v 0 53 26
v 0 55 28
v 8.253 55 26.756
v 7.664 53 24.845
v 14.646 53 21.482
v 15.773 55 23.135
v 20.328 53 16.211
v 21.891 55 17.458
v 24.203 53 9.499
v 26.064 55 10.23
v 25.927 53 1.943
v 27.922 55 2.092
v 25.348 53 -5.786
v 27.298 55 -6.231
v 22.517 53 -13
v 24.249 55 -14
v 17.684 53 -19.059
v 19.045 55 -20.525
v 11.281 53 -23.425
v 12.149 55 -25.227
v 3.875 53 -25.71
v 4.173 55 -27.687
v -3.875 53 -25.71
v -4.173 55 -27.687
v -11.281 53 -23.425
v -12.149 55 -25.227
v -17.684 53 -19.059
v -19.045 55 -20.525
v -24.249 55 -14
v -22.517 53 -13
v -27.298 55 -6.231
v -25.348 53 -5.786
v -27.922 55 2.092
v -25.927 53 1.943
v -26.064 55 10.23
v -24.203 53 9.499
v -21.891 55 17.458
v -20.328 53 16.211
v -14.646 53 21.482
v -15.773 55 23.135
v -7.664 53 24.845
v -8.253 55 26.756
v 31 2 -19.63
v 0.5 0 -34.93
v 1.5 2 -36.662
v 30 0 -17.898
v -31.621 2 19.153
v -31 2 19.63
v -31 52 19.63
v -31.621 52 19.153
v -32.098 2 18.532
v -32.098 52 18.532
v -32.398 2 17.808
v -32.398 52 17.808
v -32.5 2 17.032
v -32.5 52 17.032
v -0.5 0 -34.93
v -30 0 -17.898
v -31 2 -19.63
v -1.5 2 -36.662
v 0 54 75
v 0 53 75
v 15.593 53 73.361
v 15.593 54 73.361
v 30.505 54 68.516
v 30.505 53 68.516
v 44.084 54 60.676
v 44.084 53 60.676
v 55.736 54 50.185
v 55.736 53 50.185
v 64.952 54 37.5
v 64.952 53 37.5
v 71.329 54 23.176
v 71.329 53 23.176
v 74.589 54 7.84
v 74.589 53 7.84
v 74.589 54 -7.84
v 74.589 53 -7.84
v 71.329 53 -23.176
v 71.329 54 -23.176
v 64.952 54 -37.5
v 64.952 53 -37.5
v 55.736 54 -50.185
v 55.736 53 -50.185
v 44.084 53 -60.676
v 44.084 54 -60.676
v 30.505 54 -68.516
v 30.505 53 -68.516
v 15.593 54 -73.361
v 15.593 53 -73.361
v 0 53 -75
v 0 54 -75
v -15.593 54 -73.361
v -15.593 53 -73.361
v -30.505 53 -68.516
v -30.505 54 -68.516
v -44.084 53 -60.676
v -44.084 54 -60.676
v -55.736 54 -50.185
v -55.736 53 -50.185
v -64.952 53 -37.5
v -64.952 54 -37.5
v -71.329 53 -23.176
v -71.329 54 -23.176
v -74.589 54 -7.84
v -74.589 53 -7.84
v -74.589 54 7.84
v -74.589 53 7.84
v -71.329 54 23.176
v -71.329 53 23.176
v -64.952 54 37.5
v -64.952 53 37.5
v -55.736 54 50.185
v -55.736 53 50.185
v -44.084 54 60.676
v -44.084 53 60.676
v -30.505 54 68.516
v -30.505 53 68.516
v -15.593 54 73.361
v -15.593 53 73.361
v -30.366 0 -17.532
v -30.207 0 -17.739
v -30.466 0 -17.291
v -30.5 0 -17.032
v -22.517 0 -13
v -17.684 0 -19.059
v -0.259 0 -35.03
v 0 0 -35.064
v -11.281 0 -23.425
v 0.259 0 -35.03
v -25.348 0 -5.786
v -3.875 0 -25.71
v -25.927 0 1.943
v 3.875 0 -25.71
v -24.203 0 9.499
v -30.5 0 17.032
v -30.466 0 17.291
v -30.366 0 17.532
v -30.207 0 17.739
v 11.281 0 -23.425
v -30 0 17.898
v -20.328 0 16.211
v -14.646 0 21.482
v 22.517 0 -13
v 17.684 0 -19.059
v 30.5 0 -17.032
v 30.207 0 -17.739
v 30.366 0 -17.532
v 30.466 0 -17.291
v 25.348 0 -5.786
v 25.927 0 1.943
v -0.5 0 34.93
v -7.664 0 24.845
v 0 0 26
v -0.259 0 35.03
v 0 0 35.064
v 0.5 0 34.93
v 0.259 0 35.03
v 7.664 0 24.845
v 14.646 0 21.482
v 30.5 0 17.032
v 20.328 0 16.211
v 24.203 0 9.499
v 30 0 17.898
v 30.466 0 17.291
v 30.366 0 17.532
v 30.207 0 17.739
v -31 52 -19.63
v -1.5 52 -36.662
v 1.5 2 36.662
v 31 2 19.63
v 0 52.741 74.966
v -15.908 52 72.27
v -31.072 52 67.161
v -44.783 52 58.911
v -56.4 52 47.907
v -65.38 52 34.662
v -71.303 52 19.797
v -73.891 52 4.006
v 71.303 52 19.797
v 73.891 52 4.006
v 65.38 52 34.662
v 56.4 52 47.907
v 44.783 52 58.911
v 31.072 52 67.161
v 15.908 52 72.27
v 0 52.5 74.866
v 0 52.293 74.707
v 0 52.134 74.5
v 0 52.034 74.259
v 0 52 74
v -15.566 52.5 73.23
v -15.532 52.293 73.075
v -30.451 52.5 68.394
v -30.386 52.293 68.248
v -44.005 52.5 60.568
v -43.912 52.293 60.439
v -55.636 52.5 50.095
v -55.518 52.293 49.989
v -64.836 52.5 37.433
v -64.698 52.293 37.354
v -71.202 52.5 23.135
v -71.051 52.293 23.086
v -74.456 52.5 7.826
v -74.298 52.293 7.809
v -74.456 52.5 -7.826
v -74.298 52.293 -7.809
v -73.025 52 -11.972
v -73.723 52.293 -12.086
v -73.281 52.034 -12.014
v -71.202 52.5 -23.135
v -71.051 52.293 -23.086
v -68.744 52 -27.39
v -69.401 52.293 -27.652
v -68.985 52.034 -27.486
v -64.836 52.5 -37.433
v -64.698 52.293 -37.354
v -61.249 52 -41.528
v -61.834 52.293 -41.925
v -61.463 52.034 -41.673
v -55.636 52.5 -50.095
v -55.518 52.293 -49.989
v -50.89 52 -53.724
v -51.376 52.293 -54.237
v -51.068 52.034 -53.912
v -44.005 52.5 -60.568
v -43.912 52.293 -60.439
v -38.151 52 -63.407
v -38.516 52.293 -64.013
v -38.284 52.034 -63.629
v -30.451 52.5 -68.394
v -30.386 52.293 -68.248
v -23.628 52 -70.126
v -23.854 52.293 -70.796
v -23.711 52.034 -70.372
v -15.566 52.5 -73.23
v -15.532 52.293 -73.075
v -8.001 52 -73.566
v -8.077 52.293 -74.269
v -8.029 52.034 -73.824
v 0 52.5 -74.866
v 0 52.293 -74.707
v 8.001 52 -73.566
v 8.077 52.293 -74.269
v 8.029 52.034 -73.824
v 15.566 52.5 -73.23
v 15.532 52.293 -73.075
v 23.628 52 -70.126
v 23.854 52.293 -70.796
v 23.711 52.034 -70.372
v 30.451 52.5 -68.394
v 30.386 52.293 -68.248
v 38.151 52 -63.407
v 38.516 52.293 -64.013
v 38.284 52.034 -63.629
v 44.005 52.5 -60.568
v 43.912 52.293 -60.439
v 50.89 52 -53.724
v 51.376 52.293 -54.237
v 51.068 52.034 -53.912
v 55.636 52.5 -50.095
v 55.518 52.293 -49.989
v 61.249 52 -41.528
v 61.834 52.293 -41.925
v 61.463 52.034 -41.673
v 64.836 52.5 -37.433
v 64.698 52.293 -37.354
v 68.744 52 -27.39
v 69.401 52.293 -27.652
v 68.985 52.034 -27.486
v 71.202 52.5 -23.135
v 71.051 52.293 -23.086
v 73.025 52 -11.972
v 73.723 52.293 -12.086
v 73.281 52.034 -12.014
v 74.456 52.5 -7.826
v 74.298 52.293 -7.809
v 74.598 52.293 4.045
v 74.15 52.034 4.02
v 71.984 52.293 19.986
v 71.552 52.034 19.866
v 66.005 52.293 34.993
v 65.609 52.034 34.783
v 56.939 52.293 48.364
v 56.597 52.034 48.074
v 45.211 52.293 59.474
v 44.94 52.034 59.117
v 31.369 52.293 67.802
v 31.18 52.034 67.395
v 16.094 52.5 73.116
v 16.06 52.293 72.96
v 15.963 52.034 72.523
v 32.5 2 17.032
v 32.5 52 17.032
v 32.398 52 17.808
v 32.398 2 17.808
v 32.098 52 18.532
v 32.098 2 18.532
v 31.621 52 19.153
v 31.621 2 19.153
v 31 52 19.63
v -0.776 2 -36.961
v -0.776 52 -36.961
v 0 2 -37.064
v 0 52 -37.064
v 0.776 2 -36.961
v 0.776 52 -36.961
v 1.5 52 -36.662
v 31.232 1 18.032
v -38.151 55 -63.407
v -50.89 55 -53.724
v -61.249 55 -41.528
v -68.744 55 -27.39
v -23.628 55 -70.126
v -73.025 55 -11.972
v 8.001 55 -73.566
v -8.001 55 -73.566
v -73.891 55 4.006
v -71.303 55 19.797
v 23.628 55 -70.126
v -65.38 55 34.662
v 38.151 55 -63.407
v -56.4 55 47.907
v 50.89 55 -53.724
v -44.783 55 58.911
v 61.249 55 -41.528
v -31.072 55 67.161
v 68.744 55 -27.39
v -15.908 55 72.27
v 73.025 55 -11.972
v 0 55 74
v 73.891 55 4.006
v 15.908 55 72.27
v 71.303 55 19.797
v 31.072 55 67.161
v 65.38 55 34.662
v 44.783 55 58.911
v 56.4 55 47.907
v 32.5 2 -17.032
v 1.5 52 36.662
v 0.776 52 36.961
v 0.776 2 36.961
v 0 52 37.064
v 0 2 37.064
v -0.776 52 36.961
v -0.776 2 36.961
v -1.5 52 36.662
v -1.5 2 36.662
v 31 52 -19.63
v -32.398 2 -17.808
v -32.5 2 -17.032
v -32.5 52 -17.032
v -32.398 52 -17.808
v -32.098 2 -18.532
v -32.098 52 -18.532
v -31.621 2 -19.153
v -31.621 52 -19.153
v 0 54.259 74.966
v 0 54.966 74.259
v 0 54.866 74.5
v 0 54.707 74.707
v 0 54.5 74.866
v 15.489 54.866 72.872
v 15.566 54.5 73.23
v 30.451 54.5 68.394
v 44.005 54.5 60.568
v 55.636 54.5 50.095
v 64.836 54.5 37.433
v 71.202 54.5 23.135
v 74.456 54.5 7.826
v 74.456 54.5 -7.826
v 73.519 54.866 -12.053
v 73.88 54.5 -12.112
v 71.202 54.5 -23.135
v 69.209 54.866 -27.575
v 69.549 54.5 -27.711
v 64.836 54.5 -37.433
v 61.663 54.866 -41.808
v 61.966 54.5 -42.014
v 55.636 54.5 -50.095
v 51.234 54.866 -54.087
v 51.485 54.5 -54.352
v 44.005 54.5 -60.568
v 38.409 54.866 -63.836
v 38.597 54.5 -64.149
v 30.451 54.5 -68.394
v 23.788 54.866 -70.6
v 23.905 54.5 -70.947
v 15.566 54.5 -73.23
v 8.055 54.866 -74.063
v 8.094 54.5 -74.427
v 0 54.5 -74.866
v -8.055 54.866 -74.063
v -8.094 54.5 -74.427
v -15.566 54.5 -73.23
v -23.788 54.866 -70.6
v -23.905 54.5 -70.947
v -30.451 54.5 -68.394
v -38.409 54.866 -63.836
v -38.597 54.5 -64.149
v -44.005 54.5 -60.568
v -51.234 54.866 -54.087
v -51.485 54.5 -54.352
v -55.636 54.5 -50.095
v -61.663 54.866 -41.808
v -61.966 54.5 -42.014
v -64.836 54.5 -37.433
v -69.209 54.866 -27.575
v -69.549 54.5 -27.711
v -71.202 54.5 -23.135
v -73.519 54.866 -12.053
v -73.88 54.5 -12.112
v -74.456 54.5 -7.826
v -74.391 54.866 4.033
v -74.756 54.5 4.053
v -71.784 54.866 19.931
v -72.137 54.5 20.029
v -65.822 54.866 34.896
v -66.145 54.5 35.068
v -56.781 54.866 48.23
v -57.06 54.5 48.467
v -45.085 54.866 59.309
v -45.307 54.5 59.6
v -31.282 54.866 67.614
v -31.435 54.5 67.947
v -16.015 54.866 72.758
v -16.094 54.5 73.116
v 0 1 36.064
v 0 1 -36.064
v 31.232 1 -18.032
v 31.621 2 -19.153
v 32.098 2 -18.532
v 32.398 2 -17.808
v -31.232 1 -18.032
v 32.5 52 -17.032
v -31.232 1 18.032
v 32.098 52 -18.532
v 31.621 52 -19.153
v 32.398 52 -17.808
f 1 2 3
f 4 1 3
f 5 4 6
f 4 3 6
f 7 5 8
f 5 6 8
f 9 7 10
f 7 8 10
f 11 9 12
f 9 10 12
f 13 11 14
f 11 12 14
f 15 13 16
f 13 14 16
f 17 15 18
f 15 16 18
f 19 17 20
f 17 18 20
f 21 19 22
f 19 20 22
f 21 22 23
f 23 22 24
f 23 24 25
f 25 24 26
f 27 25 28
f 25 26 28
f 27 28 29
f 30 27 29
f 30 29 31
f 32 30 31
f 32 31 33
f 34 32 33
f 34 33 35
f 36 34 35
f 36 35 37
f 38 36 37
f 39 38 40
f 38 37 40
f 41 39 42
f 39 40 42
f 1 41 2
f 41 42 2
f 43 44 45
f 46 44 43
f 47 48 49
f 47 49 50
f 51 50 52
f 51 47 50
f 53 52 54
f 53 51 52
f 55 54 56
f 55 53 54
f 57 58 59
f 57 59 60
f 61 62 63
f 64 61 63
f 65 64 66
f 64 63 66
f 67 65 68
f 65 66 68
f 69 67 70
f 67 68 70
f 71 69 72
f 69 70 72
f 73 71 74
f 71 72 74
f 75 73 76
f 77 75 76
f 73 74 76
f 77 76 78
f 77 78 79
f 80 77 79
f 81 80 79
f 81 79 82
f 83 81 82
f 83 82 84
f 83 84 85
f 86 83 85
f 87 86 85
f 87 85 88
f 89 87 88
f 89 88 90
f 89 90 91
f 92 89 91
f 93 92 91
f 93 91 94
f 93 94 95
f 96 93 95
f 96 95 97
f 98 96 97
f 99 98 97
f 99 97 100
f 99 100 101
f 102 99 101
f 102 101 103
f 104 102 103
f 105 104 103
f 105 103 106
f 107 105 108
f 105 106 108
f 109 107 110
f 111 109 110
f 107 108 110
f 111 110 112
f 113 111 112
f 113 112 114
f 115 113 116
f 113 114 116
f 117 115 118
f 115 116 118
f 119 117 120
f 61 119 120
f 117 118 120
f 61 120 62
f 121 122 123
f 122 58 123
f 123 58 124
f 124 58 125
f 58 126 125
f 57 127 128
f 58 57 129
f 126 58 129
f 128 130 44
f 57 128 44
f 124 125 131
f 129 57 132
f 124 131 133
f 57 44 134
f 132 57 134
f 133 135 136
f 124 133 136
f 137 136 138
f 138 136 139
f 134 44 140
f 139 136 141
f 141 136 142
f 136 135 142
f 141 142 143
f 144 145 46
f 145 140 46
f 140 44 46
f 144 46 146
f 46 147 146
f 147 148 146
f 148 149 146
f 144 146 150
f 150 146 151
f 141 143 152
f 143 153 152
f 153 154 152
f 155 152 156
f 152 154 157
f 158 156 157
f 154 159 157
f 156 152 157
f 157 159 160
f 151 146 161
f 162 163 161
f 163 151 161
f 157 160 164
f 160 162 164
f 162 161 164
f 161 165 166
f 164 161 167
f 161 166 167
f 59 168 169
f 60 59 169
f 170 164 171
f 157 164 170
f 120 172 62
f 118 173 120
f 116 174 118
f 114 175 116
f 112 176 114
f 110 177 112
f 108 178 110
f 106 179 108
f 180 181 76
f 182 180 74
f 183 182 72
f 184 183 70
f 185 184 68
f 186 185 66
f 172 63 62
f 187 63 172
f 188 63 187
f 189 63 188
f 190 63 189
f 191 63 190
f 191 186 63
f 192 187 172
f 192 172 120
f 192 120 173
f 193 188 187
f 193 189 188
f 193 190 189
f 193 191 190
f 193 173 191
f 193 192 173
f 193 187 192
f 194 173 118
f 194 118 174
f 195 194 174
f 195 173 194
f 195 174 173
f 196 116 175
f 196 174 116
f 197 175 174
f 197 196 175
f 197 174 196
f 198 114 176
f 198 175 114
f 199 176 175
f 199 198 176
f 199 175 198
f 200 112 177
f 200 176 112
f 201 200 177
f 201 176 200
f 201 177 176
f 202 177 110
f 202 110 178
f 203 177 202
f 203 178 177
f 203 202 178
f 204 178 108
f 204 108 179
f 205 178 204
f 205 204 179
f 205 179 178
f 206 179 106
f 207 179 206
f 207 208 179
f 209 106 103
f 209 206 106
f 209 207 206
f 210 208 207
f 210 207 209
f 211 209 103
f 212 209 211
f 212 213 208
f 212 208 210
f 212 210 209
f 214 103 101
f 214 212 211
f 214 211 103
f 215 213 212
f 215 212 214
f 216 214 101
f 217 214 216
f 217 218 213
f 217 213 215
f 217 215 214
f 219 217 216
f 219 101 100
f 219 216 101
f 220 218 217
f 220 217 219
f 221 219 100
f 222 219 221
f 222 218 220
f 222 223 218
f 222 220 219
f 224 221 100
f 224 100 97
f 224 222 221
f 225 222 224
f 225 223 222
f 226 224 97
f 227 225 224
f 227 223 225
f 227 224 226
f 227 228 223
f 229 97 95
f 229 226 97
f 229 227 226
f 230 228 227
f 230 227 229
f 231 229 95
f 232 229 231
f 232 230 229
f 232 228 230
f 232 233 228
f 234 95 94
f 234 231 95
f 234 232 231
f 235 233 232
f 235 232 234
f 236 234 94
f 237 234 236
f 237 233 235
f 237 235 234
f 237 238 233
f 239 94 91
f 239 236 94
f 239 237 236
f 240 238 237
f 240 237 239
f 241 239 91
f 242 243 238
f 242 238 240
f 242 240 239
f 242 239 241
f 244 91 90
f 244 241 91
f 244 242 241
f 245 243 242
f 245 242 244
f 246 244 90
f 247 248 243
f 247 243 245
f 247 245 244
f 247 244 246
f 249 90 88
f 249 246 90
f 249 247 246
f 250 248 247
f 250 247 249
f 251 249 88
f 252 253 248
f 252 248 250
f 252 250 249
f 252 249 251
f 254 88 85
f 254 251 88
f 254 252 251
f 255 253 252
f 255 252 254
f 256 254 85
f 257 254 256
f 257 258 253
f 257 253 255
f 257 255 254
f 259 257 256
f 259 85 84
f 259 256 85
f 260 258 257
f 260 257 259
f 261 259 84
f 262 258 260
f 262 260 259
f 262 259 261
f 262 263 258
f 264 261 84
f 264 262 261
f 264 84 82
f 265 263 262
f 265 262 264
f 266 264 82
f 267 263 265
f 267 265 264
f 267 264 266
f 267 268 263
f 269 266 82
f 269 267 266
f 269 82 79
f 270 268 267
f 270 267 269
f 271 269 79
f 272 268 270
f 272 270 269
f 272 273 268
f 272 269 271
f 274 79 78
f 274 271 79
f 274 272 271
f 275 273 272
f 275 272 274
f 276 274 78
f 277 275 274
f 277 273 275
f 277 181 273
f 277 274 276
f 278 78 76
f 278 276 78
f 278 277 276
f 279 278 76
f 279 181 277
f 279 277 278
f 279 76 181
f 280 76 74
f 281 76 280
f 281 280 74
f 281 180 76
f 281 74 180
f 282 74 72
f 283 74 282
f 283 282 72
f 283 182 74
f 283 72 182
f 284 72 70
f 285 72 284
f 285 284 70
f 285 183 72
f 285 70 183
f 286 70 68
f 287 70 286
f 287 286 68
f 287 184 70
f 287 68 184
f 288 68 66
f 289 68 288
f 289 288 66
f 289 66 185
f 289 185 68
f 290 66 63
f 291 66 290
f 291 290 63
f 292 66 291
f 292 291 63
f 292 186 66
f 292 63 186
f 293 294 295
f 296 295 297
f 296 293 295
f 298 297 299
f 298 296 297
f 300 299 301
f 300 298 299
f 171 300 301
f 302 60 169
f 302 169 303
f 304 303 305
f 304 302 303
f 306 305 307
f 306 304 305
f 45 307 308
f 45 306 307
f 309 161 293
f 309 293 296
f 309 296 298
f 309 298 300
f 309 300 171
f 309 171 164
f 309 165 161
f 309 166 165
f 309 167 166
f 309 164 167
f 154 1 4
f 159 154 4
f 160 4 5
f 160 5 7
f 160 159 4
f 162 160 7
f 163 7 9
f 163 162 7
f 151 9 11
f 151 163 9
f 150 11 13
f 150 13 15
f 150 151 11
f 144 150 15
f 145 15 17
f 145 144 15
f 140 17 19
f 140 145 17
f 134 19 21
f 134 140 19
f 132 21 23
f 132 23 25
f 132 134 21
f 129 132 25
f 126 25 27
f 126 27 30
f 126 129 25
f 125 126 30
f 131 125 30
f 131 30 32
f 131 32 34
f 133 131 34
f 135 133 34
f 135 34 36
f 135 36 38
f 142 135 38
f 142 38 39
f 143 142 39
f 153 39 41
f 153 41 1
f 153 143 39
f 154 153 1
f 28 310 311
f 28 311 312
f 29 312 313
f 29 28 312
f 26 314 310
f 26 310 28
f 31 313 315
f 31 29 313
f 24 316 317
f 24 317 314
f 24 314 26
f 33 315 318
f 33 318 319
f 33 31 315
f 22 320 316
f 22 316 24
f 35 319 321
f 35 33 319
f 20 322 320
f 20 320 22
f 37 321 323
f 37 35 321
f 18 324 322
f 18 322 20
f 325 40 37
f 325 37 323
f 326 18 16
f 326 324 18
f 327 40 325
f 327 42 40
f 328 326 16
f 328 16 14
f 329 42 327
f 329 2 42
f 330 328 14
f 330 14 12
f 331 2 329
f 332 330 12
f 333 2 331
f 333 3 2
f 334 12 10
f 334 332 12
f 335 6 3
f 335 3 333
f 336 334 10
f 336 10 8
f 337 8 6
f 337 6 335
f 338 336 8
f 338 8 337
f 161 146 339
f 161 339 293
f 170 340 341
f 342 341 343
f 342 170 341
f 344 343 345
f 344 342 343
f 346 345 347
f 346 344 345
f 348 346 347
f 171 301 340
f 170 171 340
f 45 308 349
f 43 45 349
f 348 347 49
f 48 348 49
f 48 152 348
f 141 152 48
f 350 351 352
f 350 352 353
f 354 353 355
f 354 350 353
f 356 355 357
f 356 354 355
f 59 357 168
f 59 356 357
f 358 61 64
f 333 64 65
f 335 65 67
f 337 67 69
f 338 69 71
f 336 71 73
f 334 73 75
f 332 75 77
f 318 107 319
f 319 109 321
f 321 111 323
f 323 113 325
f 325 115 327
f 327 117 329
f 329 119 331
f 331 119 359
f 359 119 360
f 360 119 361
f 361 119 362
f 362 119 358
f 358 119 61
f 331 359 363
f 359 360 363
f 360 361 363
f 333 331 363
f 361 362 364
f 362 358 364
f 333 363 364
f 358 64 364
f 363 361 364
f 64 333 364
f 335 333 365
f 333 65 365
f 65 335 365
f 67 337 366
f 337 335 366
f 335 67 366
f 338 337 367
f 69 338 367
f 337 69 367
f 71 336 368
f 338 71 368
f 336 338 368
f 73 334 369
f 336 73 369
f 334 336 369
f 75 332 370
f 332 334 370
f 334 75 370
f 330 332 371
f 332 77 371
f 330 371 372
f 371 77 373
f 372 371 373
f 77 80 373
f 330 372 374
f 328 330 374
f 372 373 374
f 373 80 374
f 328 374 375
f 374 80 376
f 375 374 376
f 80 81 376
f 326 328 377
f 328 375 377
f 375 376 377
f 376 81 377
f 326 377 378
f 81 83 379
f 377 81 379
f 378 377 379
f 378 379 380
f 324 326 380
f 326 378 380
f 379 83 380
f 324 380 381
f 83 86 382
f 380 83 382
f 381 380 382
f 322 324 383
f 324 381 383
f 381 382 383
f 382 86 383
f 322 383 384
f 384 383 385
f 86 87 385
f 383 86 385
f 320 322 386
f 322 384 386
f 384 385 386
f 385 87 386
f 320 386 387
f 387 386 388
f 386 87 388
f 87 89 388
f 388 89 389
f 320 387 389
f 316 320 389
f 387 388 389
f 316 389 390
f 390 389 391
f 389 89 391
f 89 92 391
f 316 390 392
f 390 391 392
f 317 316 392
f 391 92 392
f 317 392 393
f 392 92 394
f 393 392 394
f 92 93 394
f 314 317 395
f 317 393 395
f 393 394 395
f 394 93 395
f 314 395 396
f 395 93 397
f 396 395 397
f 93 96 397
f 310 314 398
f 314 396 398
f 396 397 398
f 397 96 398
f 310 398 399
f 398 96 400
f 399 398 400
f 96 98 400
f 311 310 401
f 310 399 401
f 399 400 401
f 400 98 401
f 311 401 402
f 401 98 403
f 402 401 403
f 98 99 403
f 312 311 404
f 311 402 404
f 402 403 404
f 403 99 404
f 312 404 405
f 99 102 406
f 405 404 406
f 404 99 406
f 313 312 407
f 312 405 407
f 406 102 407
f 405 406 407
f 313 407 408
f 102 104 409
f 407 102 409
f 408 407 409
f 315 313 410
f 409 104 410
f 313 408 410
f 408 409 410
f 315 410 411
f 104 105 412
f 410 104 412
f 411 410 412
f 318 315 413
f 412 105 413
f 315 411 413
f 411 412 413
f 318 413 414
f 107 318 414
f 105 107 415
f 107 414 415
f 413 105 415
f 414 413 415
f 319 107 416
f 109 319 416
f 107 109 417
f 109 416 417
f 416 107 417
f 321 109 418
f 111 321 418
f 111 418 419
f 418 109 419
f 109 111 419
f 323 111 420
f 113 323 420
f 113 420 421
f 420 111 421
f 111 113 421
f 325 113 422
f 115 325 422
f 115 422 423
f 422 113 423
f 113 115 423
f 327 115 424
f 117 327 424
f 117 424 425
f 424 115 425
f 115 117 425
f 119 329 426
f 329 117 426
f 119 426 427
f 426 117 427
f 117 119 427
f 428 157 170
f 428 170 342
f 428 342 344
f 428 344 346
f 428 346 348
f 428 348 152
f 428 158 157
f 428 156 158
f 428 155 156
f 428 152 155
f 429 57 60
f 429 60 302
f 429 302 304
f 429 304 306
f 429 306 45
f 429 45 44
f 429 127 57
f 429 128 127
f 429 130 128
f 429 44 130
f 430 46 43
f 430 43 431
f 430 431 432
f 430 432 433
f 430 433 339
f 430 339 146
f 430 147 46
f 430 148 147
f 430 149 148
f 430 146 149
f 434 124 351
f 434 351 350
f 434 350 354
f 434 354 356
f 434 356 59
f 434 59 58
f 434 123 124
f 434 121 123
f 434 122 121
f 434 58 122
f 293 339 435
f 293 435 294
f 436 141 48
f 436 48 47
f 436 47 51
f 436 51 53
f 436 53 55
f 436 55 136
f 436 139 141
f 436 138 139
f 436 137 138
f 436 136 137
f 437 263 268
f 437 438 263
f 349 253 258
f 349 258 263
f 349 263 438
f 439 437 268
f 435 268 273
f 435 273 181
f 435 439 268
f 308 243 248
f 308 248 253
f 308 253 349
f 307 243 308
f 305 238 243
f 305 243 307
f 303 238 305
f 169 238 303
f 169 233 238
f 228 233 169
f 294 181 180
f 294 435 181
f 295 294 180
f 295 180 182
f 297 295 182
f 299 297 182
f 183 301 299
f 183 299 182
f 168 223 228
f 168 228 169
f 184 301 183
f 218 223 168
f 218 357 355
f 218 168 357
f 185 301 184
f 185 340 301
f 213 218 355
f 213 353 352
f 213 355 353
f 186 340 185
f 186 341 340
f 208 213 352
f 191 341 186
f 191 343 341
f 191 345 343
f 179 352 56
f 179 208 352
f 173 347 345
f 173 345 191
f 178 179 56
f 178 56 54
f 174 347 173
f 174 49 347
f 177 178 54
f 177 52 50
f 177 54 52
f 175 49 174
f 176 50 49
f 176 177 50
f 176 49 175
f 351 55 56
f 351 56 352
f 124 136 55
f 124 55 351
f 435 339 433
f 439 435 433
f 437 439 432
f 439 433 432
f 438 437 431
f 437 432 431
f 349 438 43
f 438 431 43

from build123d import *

# Parameters (mm, degrees)
SKETCH2_R               = 75
SKETCH2_R_2             = 26
BOSS_EXTRUDE1_DEPTH     = 55
CUT_EXTRUDE1_DEPTH      = 120.478031453
CUT_EXTRUDE1_DEPTH_BACK = 52
SKETCH3_R               = 75
FILLET1_R               = 3
CHAMFER1_SIZE           = 2
CHAMFER3_SIZE           = 2
FILLET2_R               = 1


with BuildPart() as part:
    # Sketch2 → Boss-Extrude1 (new body)
    with BuildSketch(Plane(origin=(0, 0, 0), x_dir=(1, 0, 0), z_dir=(0, 1, 0))):
        with Locations(Location((0, 0, 0), (0, 0, 270))):
            Circle(SKETCH2_R)
        with Locations(Location((0, 0, 0), (0, 0, 270))):
            Circle(SKETCH2_R_2, mode=Mode.SUBTRACT)
    extrude(amount=BOSS_EXTRUDE1_DEPTH)

    # Sketch3 → Cut-Extrude1 (cut, two sides: drawn at the far end of the back side and taken through both)
    with BuildSketch(Plane.XZ.offset(-CUT_EXTRUDE1_DEPTH_BACK)):
        with Locations(Location((0, 0, 0), (0, 0, 90))):
            Circle(SKETCH3_R)
        Polygon((32.5, -18.763883749), (32.5, 18.763883749), (0, 37.527767497), (-32.5, 18.763883749), (-32.5, -18.763883749), (0, -37.527767497), align=None, mode=Mode.SUBTRACT)
    extrude(amount=CUT_EXTRUDE1_DEPTH + CUT_EXTRUDE1_DEPTH_BACK, mode=Mode.SUBTRACT)

    # Fillet1
    fillet1_edges = [part.edges().sort_by_distance(p)[0] for p in [
        (0, 26, -37.527767497),
        (-32.5, 26, -18.763883749),
        (-32.5, 26, 18.763883749),
        (0, 26, 37.527767497),
        (32.5, 26, 18.763883749),
        (32.5, 26, -18.763883749),
    ]]
    fillet(fillet1_edges, radius=FILLET1_R)

    # Chamfer1
    chamfer1_edges = [part.edges().sort_by_distance(p)[0] for p in [
        (16.25, 0, -28.145825623),
        (32.5, 0, 0),
        (16.25, 0, 28.145825623),
        (-16.25, 0, 28.145825623),
        (-32.5, 0, 0),
        (-16.25, 0, -28.145825623),
        (0, 0, -37.063665882),
        (-32.098076211, 0, -18.531832941),
        (-32.098076211, 0, 18.531832941),
        (0, 0, 37.063665882),
        (32.098076211, 0, 18.531832941),
        (32.098076211, 0, -18.531832941),
    ]]
    chamfer(chamfer1_edges, length=CHAMFER1_SIZE)

    # Chamfer3
    chamfer3_edges = [part.edges().sort_by_distance(p)[0] for p in [
        (0, 55, -26),
    ]]
    chamfer(chamfer3_edges, length=CHAMFER3_SIZE)

    # Fillet2
    fillet2_edges = [part.edges().sort_by_distance(p)[0] for p in [
        (0, 52, -75),
        (0, 55, -75),
    ]]
    fillet(fillet2_edges, radius=FILLET2_R)


solid = part.part
